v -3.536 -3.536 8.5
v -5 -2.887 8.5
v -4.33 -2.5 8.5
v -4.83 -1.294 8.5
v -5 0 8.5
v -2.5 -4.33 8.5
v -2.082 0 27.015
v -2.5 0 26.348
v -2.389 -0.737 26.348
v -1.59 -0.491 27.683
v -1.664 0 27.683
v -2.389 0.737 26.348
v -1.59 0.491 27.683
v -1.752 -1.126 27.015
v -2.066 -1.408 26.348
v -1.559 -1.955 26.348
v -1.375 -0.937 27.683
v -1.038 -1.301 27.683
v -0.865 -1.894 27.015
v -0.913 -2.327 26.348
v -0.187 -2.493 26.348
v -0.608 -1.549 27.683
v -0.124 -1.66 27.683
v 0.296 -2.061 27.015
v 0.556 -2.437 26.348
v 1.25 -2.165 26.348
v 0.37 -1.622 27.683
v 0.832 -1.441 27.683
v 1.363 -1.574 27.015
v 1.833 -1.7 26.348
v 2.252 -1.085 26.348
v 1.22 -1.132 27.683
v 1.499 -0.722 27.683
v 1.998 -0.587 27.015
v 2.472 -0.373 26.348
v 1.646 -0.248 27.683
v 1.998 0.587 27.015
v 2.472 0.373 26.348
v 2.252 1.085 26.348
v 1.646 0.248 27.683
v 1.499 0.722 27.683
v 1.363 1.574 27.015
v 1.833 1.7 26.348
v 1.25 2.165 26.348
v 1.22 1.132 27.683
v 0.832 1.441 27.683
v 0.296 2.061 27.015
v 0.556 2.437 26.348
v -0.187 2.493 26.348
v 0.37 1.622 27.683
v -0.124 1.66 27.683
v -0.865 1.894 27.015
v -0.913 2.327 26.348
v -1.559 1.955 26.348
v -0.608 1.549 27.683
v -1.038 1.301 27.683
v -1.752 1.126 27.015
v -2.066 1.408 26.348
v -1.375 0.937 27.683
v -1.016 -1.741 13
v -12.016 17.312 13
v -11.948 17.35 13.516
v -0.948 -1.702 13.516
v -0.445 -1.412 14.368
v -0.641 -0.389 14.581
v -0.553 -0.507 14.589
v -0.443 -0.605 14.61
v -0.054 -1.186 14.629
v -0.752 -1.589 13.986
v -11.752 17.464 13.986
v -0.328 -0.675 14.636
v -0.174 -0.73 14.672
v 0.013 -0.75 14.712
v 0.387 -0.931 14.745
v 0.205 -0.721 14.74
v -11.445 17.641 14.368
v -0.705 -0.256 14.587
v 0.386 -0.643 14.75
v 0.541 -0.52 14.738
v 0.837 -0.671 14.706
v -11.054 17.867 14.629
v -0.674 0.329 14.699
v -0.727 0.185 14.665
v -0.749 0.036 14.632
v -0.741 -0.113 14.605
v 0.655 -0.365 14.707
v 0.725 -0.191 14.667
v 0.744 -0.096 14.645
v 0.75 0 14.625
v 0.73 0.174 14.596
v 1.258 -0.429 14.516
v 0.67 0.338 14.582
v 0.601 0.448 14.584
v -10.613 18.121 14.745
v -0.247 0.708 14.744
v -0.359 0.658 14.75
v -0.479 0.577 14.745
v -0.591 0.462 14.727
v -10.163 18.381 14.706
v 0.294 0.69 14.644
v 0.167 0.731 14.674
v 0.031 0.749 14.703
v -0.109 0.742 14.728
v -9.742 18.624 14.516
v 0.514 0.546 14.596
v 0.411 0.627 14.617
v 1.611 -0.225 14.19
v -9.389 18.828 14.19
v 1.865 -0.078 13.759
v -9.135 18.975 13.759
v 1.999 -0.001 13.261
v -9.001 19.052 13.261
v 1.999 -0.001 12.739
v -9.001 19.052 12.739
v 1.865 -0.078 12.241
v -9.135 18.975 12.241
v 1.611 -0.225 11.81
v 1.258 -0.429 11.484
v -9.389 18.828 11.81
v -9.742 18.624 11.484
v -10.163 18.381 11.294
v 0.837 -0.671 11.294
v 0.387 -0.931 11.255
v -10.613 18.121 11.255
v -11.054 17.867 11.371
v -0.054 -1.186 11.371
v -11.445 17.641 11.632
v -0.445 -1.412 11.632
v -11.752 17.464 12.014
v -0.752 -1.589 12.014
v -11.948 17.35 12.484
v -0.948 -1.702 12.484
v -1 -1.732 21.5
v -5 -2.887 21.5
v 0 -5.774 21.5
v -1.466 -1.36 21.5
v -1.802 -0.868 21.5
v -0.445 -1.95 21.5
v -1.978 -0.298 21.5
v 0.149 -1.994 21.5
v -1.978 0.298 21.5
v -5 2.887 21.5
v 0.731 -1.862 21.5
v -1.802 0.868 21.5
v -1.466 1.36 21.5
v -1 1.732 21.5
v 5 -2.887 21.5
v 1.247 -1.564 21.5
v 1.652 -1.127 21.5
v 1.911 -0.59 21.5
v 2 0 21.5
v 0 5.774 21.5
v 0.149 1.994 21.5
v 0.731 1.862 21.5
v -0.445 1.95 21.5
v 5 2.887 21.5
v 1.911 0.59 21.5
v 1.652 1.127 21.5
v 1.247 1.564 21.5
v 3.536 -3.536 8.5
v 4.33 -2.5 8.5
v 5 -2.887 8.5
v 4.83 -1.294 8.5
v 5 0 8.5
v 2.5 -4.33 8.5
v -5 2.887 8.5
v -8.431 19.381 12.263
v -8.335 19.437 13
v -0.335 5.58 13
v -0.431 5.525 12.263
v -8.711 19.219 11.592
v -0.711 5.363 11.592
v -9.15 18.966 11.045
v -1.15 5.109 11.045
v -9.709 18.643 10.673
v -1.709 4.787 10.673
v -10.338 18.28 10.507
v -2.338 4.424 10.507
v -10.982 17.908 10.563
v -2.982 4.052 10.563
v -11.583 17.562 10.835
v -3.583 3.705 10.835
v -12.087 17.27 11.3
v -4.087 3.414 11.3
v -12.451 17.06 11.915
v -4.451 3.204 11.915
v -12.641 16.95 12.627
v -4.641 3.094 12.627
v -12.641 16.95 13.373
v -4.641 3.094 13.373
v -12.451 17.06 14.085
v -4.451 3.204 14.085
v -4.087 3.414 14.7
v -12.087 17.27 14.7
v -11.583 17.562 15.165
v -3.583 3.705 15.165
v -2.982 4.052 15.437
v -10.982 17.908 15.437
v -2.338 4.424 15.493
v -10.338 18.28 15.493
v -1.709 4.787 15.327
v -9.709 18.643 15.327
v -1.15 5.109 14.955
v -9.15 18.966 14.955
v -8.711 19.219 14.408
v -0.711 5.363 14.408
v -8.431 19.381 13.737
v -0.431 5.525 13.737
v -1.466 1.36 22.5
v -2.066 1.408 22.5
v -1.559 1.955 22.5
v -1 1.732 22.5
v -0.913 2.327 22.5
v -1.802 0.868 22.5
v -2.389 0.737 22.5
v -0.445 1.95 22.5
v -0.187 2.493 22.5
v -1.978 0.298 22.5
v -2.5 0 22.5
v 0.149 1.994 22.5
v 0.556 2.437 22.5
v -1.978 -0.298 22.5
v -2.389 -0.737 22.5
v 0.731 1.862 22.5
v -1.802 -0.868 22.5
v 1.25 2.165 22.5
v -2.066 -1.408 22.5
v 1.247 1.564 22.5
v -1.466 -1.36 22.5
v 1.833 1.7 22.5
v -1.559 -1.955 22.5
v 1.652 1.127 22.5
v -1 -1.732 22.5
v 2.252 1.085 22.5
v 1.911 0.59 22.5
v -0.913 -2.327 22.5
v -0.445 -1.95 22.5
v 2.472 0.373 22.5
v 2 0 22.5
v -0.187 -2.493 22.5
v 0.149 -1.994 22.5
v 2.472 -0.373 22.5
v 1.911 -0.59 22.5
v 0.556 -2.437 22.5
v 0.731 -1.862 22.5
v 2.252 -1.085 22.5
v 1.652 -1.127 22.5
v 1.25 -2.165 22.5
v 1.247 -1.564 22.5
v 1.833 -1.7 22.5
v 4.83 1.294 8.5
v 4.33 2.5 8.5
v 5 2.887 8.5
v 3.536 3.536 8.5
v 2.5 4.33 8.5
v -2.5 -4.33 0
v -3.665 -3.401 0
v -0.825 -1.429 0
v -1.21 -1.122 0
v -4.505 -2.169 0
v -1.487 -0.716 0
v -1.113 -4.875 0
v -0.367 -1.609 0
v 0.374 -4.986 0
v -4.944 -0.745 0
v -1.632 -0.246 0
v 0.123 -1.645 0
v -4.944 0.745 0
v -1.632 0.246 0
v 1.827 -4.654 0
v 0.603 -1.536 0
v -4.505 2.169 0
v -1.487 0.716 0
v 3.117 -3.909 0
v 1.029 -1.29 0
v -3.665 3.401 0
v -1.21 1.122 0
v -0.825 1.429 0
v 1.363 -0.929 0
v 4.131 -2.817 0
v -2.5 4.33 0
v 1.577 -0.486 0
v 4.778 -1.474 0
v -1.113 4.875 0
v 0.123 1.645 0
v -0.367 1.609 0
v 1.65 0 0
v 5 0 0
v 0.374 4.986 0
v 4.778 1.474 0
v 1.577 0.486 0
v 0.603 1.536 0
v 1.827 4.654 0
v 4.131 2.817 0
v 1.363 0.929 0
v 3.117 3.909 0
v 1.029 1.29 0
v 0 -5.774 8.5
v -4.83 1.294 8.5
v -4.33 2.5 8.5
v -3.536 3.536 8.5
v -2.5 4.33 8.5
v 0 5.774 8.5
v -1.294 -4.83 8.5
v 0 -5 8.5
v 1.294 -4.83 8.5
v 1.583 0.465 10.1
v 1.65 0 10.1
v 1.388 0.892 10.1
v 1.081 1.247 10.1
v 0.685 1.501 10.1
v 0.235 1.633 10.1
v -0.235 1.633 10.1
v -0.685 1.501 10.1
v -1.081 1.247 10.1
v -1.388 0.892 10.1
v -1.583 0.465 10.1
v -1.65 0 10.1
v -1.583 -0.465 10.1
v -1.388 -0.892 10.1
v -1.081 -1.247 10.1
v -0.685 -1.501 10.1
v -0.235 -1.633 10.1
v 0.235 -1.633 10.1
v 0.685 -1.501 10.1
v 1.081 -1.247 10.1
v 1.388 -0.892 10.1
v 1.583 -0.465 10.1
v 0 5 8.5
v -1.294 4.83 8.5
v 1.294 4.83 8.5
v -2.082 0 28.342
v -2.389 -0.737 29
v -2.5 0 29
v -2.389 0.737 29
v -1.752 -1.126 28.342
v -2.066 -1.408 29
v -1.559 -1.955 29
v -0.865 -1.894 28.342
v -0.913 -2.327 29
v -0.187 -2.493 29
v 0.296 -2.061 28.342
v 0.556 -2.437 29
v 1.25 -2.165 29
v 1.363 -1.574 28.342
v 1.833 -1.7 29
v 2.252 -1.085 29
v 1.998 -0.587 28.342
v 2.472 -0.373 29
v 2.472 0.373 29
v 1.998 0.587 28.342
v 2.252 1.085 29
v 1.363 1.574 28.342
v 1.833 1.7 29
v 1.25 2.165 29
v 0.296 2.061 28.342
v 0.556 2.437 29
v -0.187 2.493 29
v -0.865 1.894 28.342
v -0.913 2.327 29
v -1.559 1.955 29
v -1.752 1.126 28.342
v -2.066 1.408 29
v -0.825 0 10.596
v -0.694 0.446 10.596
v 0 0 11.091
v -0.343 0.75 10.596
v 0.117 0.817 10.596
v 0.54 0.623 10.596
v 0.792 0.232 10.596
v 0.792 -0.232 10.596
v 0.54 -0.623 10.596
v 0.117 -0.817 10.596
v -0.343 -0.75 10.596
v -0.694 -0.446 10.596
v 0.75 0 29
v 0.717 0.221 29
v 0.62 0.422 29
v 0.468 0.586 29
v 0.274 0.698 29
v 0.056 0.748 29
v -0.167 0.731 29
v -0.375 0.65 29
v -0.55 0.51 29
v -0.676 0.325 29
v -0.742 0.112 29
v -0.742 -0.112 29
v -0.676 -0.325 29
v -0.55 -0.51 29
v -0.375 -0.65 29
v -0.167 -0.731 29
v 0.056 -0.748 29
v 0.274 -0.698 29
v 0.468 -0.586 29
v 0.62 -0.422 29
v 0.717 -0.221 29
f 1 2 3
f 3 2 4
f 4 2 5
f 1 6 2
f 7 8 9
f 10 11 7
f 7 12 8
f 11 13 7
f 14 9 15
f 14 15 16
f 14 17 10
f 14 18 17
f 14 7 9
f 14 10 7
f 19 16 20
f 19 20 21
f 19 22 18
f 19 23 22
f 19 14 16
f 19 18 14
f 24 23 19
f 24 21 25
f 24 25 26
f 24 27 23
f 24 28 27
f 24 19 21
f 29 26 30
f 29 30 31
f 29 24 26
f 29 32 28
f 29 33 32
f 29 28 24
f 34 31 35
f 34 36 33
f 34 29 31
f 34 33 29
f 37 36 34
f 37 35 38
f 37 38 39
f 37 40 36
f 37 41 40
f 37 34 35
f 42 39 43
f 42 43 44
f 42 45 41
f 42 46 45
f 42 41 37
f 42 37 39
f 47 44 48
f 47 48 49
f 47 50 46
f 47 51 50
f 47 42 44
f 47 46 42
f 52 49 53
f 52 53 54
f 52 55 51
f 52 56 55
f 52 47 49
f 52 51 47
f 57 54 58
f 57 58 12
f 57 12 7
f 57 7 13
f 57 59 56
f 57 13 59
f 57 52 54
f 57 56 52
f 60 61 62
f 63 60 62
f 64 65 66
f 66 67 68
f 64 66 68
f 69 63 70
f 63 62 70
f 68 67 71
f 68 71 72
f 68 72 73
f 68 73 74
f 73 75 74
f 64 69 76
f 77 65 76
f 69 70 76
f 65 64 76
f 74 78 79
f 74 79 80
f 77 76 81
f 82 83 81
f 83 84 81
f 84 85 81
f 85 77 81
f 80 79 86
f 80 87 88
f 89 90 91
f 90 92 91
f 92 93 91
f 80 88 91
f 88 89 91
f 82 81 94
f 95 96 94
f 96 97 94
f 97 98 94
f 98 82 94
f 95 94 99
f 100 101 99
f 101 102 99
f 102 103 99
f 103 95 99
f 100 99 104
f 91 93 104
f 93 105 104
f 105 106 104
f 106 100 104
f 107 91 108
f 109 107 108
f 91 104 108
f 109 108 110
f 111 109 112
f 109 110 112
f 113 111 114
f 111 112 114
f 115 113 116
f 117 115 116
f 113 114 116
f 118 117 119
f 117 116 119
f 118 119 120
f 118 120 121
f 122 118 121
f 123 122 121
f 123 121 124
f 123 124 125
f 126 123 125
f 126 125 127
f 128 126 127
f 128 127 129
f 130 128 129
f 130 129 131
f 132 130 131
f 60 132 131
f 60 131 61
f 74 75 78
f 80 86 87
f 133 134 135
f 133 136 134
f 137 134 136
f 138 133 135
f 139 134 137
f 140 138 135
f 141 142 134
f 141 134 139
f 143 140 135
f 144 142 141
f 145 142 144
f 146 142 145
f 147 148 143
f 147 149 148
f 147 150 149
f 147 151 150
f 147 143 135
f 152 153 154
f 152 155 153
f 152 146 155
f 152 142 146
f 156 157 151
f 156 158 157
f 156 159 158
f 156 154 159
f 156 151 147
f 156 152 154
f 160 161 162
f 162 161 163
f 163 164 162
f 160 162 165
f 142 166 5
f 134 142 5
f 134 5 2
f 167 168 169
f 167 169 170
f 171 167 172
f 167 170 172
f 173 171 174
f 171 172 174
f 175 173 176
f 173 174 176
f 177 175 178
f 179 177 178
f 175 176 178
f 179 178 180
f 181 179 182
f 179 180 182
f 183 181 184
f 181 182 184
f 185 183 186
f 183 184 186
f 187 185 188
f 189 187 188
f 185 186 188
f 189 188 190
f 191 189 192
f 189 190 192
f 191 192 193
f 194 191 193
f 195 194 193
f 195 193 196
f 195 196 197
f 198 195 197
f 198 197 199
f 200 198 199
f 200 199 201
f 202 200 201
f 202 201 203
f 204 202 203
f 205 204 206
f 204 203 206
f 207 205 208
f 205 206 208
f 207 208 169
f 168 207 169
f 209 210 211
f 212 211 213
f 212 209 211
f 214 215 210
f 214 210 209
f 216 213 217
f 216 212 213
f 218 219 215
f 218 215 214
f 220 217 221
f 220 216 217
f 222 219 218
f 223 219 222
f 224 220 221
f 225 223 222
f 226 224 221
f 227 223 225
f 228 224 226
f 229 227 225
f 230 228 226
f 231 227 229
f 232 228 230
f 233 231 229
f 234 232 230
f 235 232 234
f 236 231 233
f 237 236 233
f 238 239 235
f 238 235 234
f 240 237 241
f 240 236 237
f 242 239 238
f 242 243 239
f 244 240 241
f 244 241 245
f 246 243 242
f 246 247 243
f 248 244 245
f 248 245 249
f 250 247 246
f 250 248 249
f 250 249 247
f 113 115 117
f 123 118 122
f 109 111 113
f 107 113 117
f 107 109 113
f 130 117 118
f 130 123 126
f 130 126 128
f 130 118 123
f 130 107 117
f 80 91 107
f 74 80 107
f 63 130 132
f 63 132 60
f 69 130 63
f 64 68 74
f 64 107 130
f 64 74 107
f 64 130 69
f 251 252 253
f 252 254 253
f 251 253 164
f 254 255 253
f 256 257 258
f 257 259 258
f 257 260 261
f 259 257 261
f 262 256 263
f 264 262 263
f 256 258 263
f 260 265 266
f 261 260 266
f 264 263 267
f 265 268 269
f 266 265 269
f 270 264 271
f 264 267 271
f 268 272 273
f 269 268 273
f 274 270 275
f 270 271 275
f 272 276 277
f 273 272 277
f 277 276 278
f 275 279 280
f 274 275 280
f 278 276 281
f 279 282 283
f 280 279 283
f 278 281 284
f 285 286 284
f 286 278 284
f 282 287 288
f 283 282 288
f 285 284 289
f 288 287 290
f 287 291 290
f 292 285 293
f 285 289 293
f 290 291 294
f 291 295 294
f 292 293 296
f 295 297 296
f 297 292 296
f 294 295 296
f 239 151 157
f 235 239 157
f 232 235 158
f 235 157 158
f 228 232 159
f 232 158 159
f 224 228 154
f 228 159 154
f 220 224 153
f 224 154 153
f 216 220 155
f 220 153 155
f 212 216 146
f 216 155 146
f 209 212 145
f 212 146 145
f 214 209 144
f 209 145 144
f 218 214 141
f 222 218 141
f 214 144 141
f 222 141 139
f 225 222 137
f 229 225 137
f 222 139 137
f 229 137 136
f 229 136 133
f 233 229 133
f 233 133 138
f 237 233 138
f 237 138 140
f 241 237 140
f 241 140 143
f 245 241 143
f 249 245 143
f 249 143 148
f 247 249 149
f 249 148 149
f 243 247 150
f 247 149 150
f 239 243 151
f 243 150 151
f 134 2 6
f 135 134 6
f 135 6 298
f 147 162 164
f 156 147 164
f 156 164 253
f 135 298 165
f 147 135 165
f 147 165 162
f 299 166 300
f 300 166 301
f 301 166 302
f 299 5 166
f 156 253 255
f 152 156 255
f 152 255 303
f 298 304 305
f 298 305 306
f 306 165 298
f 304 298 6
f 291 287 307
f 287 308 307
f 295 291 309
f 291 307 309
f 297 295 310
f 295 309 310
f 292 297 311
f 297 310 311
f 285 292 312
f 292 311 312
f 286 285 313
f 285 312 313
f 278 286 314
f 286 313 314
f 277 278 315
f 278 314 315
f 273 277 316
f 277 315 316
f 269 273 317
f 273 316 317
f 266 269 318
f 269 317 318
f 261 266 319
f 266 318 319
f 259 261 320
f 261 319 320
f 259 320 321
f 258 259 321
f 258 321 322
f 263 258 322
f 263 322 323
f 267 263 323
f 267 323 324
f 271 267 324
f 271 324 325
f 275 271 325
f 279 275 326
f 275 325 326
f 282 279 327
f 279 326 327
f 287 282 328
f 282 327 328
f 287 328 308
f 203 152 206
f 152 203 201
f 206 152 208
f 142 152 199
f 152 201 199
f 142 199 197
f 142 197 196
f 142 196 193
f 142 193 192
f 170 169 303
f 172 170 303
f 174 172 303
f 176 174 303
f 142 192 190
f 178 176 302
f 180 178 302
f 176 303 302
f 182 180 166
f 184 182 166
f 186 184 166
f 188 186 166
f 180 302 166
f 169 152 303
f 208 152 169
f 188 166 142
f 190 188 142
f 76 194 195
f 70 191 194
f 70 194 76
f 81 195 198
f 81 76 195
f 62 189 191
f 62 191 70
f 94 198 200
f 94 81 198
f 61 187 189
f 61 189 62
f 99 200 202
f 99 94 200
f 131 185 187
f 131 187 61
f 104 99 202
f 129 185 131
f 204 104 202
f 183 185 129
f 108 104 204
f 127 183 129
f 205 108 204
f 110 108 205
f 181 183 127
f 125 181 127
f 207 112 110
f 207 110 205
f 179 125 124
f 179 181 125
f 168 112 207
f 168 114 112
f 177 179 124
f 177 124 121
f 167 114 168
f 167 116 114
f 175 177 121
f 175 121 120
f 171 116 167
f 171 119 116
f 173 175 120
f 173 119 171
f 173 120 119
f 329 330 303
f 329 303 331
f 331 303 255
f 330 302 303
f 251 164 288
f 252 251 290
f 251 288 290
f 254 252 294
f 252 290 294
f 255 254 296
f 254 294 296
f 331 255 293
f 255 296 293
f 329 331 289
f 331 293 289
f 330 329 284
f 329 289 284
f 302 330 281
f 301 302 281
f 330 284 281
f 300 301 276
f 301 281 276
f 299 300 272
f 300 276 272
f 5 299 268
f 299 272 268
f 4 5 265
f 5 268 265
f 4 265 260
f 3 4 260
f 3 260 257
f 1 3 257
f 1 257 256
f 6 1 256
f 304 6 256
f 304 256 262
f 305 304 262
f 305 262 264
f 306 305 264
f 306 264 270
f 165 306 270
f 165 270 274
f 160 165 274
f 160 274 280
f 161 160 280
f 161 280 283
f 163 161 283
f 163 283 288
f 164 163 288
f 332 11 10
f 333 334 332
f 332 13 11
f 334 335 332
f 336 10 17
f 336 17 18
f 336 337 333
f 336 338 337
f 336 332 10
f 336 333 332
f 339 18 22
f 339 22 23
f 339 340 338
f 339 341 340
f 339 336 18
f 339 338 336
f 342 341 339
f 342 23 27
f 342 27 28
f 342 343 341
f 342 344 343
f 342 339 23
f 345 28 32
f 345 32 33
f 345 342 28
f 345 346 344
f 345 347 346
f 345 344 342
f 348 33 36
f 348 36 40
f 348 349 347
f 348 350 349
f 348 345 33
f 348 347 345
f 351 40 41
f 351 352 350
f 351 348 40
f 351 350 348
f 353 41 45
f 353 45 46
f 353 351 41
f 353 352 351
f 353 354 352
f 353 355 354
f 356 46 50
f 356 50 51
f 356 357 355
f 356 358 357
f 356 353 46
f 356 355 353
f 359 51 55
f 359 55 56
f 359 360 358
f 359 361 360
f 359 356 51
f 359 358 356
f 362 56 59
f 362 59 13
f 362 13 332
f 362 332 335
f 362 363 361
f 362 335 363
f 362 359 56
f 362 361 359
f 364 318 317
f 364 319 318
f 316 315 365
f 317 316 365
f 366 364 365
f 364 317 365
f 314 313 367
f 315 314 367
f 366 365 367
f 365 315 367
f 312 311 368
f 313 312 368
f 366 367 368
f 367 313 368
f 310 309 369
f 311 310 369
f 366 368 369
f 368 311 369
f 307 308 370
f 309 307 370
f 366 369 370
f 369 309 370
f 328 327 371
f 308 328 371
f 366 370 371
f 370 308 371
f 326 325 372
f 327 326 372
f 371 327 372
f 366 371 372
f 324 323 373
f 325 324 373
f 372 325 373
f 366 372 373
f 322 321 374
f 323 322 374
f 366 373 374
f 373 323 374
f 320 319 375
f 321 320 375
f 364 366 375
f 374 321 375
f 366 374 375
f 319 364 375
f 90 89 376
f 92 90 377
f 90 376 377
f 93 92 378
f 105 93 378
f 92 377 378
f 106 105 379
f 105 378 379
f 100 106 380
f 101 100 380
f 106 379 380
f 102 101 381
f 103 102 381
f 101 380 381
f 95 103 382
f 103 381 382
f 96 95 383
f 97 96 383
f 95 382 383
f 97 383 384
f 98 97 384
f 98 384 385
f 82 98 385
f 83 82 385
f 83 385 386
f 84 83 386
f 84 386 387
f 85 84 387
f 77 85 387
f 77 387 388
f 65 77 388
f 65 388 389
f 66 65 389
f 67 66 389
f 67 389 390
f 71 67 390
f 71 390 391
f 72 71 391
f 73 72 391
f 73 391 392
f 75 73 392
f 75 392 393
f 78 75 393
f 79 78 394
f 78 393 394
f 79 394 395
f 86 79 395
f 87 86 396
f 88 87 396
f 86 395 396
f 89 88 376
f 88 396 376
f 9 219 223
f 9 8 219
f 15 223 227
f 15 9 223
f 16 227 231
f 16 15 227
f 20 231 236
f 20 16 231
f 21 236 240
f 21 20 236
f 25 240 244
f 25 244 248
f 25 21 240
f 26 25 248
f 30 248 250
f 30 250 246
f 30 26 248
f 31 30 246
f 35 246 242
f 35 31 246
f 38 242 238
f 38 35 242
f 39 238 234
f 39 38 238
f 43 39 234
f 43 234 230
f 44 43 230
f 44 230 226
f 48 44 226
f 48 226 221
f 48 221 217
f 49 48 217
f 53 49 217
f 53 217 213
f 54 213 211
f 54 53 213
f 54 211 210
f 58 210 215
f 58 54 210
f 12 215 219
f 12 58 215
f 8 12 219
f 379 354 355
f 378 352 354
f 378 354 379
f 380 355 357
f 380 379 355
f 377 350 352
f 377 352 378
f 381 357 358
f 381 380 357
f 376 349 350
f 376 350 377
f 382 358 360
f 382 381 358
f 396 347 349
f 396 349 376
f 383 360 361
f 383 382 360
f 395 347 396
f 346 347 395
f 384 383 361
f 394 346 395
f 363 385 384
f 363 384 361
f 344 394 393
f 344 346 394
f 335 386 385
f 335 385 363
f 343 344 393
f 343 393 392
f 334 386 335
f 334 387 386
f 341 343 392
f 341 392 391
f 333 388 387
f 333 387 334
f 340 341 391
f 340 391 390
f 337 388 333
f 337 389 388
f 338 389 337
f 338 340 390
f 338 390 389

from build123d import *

# Parameters (mm, degrees)
SKETCH_1_R             = 5
EXTRUDE_1_DEPTH        = 8.5
EXTRUDE_2_DEPTH        = 13
SKETCH_3_R             = 2
EXTRUDE_3_DEPTH        = 1
SKETCH_5_R             = 0.75
CUT_EXTRUDE_1_DEPTH    = 15
SKETCH_6_R             = 2.5
EXTRUDE_4_DEPTH        = 16
SKETCH_7_R             = 1.75
CUT_EXTRUDE_2_DEPTH    = 22
HOLE_WIZARD_M4_1_D     = 3.3
HOLE_WIZARD_M4_1_DEPTH = 10.1
HOLE_WIZARD_M4_1_TIP   = 0.991420021


with BuildPart() as part:
    # 草图1 → 凸台-拉伸1 (new body)
    with BuildSketch(Plane.XY):
        Circle(SKETCH_1_R)
    extrude(amount=EXTRUDE_1_DEPTH)

    # 草图2 → 凸台-拉伸2 (add)
    with BuildSketch(Plane.XY.offset(8.5)):
        Polygon((5, 2.886751346), (0, 5.773502692), (-5, 2.886751346), (-5, -2.886751346), (0, -5.773502692), (5, -2.886751346), align=None)
    extrude(amount=EXTRUDE_2_DEPTH)

    # 草图3 → 凸台-拉伸3 (add)
    with BuildSketch(Plane.XY.offset(21.5)):
        Circle(SKETCH_3_R)
    extrude(amount=EXTRUDE_3_DEPTH)

    # 草图4 → 旋转1 (revolve)
    with BuildSketch(Plane(origin=(0, 0, 0), x_dir=(1, 0, 0), z_dir=(0, 1, 0)), mode=Mode.PRIVATE) as revolve_1_sk:
        Polygon((0, -22.5), (2.5, -22.5), (2.5, -26.347532538), (1.664204883, -27.683358747), (2.5, -29), (0, -29), align=None)
    revolve(revolve_1_sk.sketch.rotate(Axis((0, 0, 22.5), (0, 0, 1)), 180), axis=Axis((0, 0, 22.5), (0, 0, 1)))

    # 草图5 → 切除-拉伸1 (cut)
    with BuildSketch(Plane.XY.offset(29)):
        Circle(SKETCH_5_R)
    extrude(amount=-CUT_EXTRUDE_1_DEPTH, mode=Mode.SUBTRACT)

    # 草图6 → 凸台-拉伸4 (add)
    with BuildSketch(Plane(origin=(-2.5, 4.330127019, 0), x_dir=(0.8660254037844388, 0.49999999999999983, 0), z_dir=(-0.4999999999999998, 0.8660254037844387, 0))):
        with Locations((0, -13)):
            Circle(SKETCH_6_R)
    extrude(amount=EXTRUDE_4_DEPTH)

    # 草图7 → 切除-拉伸2 (cut)
    with BuildSketch(Plane(origin=(-10.5, 18.186533479, 0), x_dir=(0.8660254037844387, 0.49999999999999994, 0), z_dir=(-0.4999999999999999, 0.8660254037844386, 0))):
        with Locations(Location((0, -13, 0), (0, 0, 180))):
            Circle(SKETCH_7_R)
    extrude(amount=-CUT_EXTRUDE_2_DEPTH, mode=Mode.SUBTRACT)

    # M4 螺纹孔1
    with Locations(Plane(origin=(0, 0, 0), x_dir=(-1, 0, 0), z_dir=(0, 0, -1))):
        with Locations((0, 0)):
            Hole(HOLE_WIZARD_M4_1_D / 2, depth=HOLE_WIZARD_M4_1_DEPTH)
            with Locations((0, 0, -(HOLE_WIZARD_M4_1_DEPTH + HOLE_WIZARD_M4_1_TIP / 2))):  # 118° drill point
                Cone(0, HOLE_WIZARD_M4_1_D / 2, HOLE_WIZARD_M4_1_TIP, mode=Mode.SUBTRACT)


solid = part.part
